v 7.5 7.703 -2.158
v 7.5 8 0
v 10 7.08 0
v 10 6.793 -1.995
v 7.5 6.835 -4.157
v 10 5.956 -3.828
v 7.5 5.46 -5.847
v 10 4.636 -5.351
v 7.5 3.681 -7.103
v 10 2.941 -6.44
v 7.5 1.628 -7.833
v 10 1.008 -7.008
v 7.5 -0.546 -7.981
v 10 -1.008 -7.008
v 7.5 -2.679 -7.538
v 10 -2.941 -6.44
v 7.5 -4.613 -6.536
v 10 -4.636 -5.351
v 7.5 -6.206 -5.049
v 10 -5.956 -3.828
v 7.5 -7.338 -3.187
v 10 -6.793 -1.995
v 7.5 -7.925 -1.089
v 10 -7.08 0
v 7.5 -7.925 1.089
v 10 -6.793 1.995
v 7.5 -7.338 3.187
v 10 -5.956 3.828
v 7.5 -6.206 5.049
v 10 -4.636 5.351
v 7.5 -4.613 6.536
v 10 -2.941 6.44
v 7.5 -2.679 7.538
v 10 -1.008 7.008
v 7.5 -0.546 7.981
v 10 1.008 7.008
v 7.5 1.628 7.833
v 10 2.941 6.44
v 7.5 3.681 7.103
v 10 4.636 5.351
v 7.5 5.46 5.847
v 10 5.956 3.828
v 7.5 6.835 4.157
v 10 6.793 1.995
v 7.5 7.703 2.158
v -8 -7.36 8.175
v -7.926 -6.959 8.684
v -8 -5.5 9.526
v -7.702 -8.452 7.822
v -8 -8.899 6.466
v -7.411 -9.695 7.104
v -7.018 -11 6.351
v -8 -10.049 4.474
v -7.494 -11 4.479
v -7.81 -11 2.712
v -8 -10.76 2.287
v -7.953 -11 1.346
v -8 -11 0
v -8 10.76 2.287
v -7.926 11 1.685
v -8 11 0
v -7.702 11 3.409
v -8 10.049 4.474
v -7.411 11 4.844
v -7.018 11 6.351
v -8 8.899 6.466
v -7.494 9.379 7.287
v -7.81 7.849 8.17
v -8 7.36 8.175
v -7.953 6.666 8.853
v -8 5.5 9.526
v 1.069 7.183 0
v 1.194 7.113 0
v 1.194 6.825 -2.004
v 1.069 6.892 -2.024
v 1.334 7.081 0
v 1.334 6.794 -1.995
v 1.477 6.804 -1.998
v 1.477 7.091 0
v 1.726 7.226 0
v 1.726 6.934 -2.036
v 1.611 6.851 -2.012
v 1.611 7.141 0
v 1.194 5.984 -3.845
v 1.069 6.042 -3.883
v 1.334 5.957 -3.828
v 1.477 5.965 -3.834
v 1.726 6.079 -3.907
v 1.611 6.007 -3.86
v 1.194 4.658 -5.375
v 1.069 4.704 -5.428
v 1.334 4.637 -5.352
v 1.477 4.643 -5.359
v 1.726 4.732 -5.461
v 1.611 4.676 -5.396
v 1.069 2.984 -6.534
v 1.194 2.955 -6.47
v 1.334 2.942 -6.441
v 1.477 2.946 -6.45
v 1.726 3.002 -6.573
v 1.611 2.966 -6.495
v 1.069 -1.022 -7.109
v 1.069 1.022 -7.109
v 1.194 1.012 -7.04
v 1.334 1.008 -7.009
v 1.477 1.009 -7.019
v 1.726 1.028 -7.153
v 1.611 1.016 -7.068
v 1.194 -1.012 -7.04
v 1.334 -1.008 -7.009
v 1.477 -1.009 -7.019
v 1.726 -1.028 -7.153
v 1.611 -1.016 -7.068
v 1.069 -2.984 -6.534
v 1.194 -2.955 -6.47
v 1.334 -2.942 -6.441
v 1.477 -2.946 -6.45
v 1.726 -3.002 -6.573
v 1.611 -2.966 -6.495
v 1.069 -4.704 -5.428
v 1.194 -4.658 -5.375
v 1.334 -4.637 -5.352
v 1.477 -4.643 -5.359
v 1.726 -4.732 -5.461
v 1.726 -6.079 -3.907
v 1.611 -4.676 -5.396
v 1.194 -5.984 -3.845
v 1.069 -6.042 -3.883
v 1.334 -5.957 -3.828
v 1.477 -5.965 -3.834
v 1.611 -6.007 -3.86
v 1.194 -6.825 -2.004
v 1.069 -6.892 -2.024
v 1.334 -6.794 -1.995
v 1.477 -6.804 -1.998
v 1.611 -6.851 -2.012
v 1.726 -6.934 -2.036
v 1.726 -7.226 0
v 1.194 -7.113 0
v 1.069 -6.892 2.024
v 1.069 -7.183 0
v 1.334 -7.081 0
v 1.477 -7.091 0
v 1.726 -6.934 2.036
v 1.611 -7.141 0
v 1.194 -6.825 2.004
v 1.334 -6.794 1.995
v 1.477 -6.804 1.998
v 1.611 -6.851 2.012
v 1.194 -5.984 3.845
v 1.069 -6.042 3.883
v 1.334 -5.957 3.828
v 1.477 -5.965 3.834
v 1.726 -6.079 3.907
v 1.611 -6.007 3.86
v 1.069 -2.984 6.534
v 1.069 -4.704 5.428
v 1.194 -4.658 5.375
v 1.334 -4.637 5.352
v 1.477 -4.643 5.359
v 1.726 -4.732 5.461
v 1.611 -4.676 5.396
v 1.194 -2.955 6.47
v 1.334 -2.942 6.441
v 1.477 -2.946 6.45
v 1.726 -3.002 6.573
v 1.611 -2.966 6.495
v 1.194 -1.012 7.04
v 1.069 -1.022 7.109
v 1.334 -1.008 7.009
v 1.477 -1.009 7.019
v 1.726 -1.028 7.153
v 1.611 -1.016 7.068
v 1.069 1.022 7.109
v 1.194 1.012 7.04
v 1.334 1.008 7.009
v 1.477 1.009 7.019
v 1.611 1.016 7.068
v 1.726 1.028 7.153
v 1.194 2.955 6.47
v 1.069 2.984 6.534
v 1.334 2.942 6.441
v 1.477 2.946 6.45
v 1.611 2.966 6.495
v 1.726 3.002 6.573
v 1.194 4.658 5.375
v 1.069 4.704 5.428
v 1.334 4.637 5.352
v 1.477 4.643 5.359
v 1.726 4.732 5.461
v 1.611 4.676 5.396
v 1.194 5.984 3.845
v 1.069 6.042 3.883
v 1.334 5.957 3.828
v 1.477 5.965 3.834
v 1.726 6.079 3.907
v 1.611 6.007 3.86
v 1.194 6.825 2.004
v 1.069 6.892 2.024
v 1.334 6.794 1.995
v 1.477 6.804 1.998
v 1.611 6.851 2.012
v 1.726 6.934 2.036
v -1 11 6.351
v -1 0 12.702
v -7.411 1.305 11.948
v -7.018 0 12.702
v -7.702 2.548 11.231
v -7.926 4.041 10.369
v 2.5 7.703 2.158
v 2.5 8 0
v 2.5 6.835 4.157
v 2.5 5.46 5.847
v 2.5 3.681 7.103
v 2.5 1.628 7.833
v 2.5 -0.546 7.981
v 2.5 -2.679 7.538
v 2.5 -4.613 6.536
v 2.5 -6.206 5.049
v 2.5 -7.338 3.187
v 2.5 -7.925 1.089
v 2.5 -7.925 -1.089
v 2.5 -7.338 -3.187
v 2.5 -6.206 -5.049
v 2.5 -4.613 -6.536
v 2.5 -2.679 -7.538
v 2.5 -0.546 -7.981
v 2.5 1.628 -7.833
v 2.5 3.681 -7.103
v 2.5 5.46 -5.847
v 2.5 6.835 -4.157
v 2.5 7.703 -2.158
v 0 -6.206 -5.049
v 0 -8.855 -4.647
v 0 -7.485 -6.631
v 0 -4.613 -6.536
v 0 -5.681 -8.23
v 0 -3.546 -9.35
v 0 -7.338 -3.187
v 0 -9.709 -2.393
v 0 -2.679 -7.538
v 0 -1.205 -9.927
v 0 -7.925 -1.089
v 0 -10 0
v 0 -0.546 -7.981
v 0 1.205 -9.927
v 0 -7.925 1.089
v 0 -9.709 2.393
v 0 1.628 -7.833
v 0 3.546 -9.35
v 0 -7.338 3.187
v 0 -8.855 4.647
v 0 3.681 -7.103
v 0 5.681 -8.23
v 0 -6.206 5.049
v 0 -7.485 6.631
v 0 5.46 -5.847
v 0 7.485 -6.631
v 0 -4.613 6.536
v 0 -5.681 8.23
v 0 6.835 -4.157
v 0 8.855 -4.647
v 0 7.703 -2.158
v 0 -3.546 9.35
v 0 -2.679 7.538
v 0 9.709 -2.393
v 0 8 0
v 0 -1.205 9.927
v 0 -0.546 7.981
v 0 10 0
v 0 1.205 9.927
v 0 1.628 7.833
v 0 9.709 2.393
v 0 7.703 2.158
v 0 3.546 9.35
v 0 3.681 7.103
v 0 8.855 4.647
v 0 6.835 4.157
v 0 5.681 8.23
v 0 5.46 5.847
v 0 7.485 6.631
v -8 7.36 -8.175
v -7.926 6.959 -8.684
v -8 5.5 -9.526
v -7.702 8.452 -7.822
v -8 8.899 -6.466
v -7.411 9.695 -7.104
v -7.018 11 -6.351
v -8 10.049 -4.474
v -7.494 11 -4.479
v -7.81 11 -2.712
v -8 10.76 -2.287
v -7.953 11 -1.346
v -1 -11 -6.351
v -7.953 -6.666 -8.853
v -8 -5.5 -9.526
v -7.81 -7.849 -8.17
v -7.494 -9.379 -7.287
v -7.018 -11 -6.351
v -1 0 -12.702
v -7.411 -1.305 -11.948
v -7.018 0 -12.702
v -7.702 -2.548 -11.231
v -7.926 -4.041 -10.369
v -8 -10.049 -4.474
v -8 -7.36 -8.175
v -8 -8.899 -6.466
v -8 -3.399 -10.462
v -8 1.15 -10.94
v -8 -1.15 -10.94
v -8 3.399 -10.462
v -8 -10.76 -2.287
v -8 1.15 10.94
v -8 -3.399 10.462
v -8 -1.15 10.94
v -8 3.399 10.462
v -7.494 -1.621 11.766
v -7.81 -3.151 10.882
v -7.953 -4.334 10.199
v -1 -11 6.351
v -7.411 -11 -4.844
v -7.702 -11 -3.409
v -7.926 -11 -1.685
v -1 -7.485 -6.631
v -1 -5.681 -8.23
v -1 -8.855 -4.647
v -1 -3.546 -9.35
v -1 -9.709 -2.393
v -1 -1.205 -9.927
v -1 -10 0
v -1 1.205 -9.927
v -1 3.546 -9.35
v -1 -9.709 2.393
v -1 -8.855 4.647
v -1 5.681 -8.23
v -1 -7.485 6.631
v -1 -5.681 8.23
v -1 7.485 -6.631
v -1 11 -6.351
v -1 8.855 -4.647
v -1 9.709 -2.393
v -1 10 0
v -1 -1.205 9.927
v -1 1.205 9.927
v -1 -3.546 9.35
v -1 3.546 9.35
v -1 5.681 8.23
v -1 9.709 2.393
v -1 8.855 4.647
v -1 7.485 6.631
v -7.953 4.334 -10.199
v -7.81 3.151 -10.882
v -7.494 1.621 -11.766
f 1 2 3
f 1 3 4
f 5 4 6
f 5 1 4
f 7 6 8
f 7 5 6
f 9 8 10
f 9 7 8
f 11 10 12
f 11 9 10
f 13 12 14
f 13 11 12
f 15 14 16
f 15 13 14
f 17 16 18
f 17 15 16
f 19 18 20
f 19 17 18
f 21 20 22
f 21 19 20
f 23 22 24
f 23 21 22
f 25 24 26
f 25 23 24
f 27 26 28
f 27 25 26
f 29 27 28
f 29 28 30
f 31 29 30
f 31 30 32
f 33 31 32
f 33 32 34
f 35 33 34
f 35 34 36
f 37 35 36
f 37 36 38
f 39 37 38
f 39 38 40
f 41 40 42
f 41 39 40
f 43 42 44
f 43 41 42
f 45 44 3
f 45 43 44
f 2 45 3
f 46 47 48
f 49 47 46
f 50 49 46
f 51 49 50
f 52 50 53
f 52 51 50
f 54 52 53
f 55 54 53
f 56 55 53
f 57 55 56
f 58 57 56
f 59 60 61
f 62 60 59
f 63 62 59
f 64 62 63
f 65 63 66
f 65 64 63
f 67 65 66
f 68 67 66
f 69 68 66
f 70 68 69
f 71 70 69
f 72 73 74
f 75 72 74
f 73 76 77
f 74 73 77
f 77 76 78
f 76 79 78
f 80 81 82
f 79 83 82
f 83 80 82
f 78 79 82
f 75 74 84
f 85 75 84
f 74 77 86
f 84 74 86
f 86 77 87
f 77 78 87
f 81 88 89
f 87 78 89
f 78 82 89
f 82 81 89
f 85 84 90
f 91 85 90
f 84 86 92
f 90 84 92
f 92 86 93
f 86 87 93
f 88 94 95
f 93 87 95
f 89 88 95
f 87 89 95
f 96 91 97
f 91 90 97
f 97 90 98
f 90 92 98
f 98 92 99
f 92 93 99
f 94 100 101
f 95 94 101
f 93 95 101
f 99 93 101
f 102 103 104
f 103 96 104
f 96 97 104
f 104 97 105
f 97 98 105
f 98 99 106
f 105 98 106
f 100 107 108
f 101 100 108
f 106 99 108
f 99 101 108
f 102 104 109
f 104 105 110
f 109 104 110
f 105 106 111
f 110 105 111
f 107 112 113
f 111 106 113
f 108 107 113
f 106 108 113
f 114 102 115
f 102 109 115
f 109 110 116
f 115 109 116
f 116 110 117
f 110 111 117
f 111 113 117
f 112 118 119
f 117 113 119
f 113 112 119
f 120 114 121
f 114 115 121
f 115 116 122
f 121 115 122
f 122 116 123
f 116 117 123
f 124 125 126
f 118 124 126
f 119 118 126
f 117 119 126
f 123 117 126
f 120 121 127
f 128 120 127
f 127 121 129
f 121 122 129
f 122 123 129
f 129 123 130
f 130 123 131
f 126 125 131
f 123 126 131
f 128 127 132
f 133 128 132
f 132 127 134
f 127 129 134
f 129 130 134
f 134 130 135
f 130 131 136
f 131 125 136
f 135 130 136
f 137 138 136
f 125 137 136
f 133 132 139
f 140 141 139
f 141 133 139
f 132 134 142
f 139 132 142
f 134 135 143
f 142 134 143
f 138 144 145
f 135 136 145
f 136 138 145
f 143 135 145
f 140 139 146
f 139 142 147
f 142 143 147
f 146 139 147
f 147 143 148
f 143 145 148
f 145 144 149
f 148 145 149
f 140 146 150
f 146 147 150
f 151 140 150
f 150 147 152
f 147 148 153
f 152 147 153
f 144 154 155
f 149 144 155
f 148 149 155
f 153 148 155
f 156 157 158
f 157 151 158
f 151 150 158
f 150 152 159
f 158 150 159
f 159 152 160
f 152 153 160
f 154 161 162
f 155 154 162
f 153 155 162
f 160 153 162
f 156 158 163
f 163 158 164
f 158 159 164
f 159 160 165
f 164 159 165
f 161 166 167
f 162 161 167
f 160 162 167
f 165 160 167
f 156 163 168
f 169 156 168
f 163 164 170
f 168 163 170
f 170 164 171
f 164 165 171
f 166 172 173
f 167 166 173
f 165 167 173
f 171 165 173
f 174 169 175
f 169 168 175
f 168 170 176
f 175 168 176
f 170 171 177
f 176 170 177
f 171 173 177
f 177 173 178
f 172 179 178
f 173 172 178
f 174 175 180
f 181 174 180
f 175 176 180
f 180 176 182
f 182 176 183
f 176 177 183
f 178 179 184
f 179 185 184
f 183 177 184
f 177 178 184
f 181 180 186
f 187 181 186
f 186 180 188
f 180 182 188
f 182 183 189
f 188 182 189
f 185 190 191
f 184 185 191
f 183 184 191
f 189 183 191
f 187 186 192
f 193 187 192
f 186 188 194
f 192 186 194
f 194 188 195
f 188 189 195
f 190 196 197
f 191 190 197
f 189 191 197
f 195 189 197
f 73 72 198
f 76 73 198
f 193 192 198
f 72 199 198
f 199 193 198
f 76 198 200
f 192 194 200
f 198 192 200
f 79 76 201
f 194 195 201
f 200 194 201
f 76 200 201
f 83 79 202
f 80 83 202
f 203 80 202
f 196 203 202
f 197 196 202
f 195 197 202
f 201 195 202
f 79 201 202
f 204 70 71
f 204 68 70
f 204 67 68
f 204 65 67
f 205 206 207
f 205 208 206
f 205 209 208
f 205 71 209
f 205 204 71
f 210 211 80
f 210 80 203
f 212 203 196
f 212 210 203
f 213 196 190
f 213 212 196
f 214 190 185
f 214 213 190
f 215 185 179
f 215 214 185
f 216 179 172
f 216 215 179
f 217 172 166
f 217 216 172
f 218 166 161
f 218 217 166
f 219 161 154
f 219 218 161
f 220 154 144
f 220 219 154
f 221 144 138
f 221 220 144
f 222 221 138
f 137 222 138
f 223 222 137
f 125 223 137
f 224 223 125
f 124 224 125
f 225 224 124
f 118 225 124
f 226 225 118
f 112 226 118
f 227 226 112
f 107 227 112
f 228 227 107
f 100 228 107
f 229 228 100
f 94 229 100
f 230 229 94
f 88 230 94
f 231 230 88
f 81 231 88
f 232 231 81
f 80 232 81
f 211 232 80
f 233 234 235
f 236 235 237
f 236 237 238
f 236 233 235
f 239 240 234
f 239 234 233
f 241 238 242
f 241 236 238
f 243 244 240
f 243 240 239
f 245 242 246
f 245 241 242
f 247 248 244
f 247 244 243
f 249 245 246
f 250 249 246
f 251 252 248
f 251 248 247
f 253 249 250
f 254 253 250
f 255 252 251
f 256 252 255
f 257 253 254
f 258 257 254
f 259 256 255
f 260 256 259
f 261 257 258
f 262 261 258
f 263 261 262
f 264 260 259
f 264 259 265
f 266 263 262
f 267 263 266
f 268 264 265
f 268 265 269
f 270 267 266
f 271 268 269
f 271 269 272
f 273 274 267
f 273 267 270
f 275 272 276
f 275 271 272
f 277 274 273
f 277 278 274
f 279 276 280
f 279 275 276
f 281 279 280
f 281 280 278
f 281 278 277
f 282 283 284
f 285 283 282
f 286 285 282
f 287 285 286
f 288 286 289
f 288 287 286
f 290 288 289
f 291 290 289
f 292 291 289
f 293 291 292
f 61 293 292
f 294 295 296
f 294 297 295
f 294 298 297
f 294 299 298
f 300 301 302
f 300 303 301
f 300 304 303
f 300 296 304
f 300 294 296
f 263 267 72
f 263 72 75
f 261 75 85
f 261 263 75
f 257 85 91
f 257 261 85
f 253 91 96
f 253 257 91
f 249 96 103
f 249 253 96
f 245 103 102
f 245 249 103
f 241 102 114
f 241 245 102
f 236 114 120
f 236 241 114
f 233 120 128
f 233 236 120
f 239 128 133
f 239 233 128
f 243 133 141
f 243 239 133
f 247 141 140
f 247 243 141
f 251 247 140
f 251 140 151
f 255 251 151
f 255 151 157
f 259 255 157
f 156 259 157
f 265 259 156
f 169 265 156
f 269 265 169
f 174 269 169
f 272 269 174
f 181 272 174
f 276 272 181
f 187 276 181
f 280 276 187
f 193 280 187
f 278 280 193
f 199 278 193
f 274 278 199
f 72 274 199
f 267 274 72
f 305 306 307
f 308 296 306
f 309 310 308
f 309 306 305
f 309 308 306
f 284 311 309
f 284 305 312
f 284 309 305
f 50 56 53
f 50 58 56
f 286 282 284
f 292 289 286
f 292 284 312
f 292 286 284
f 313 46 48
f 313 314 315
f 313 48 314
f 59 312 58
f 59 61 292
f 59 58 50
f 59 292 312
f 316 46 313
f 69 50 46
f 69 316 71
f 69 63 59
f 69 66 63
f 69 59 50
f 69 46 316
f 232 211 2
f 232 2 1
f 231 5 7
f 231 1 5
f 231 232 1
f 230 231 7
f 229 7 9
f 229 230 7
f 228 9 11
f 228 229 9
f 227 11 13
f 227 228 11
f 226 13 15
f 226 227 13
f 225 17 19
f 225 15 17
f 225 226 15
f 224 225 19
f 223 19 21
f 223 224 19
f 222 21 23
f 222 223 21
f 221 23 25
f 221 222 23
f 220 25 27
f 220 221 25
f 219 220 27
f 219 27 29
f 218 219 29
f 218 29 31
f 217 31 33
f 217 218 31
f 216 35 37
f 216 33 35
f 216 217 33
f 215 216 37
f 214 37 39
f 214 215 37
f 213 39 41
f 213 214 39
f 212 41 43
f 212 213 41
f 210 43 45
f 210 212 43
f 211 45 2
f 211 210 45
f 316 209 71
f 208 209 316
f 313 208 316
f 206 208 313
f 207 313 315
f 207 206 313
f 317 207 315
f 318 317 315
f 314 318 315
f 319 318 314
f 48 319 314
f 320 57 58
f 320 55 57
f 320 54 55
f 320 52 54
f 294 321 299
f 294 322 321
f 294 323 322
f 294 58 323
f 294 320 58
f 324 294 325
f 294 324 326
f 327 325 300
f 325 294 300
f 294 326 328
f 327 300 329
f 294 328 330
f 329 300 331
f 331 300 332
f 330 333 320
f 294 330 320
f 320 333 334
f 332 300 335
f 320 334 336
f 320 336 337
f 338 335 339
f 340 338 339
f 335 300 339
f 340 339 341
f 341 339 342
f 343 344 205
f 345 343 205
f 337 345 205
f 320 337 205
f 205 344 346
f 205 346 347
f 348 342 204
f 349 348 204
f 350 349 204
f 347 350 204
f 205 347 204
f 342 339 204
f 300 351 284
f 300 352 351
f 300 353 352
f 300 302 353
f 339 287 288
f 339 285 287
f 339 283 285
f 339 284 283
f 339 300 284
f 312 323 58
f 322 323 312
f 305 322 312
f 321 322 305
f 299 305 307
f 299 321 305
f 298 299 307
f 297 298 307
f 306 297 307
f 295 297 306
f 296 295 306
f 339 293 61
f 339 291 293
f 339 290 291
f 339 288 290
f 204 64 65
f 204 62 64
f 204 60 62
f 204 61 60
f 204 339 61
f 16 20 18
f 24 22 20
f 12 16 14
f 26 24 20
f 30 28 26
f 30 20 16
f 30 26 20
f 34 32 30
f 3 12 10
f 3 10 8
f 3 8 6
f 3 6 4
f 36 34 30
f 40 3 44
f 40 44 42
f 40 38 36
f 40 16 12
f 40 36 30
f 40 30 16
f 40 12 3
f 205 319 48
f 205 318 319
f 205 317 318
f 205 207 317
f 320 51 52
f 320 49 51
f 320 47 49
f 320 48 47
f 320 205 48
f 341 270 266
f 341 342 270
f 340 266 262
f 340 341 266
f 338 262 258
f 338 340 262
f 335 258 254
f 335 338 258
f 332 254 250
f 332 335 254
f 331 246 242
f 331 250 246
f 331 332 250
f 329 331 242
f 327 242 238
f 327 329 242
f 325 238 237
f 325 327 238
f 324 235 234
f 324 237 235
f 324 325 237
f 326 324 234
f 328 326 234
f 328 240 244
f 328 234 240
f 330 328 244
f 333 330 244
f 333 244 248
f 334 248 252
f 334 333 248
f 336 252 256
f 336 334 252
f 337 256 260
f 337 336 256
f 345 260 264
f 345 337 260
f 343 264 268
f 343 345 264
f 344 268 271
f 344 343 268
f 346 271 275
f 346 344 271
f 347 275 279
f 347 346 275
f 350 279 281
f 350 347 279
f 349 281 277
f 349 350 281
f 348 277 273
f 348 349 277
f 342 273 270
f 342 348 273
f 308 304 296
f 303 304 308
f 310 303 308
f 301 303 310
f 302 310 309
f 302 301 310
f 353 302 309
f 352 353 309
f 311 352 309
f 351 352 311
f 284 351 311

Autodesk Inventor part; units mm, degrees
ref_plane "YZ Plane" through (0, 0, 0) normal (1, 0, 0) x (0, 1, 0)
ref_plane "XZ Plane" through (0, 0, 0) normal (0, 1, 0) x (-1, 0, 0)
sketch "草图1" plane through (0, 0, 0) normal (0, 0, 1) x (1, 0, 0)
  line L0 (-1, 0) -> (10, 0)
  line L1 (10, 0) -> (10, 8)
  line L2 (10, 8) -> (0, 8)
  line L3 (0, 8) -> (0, 10)
  line L4 (0, 10) -> (-1, 10)
  line L5 (-1, 10) -> (-1, 0)
  line L6 (-3.2, 0) -> (12.2, 0) projected
  line L7 (0, -2) -> (0, 12) projected
  line L8 (0, 7.0798) -> (9.9654, 7.0798) construction
  line L9 (2.5, 8) -> (1.7263, 7.2263)
  line L10 (1.069, 7.1826) -> (0, 8)
  arc A0 (1.069, 7.1826) -> (1.7263, 7.2263) centre (1.3727, 7.5798) ccw
  dimension "d0" = 16
  dimension "d1" = 10
  dimension "d2" = 1
  dimension "d3" = 20
  dimension "d5" = 14.1596
  dimension "d6" = 0.5
  dimension "d7" = 45
  dimension "d8" = 2.5
revolve "轴承体" add sketch "草图1" angle 360 about axis through (-1, 0, 0) along (1, 0, 0)
sketch "草图2" plane through (-1, 0, 0) normal (-1, 0, 0) x (0, 0, 1)
  circle A0 centre (0, 0) radius 10 projected
  line L0 (6.3509, 11) -> (12.7017, 0)
  line L1 (12.7017, 0) -> (6.3509, -11)
  line L2 (6.3509, -11) -> (-6.3509, -11)
  line L3 (-6.3509, -11) -> (-12.7017, 0)
  line L4 (-12.7017, 0) -> (-6.3509, 11)
  line L5 (-6.3509, 11) -> (6.3509, 11)
  dimension "d11" = 22
extrude "头" add sketch "草图2" along normal blind 7 contours A0 | L0 L1 L2 L3 L4 L5
revolve "沟槽1" cut sketch "草图1" angle 360 about axis through (-1, 0, 0) along (1, 0, 0) contours L2 L9 A0 L10
sketch "草图3" plane through (0, 0, 0) normal (0, 1, 0) x (-1, 0, 0)
  line L0 (7.0175, 12.7017) -> (8, 12.7017)
  line L1 (8, 12.7017) -> (8, 11)
  line L2 (8, 11) -> (7.0175, 12.7017)
  line L3 (9.4, 0) -> (-0.4, 0) projected
  line L4 (1, 12.7017) -> (8, 12.7017) projected
  line L5 (8, 6.3509) -> (8, 12.7017) projected
  dimension "d14" = 30
  dimension "d15" = 11
revolve "倒角2" cut sketch "草图3" angle 360 about axis through (-10, 0, 0) along (1, 0, 0)
thread "螺纹" size "M16x1.5" class "6g" standard "ISO Metric profile" length 10
chamfer "倒角1" distance 0.9202 distance2 2.5 1 edges at (10, -8, 0) measured on face at (10, -0.1598, -1.3157)
ref_plane "Work Plane1" through (5, 0, 0) normal (0, 0.5, 0.8660254) x (1, 0, 0)
equation "\"d11\" = SW"
equation "\"d12\" = KOH"
equation "\"d0\" = NND"
equation "\"d1\" = NLG"
equation "\"d2\" = SD"
equation "\"d3\" = SD2"
equation "\"d5\" = GD1"
equation "\"d6\" = 0.2 * GAL1"
equation "\"d8\" = GAL1"
equation "\"d17\" = GEL"
equation "\"d9\" = -0.5 * GD1 + 0.5 * NND"
equation "\"d10\" = GAL1"
equation "\"d15\" = 0.5 * SW"
equation "\"NND\" = 16"
equation "\"NLG\" = 10"
equation "\"GAL1\" = 2.5"
equation "\"SD\" = 1"
equation "\"SD2\" = 20"
equation "\"GD1\" = THREADDIA - 1.2269 * PTC"
equation "\"SW\" = 22"
equation "\"KOH\" = 7"
equation "\"GEL\" = NLG"
equation "\"GUL\" = 0.61345 * PTC"
equation "\"PHH\" = 0.8"
equation "\"RR\" = 1"
equation "\"THREADDIA\" = 16"
equation "\"TOA\" = 30deg"
equation "\"PTC\" = 1.5"
equation "\"GAL\" = 0.61345 * PTC"
equation "\"E0\" = 25.4"
properties part number "CSN 02 1915.11 - M16 x 1.5 x 10" material "钢，软"
